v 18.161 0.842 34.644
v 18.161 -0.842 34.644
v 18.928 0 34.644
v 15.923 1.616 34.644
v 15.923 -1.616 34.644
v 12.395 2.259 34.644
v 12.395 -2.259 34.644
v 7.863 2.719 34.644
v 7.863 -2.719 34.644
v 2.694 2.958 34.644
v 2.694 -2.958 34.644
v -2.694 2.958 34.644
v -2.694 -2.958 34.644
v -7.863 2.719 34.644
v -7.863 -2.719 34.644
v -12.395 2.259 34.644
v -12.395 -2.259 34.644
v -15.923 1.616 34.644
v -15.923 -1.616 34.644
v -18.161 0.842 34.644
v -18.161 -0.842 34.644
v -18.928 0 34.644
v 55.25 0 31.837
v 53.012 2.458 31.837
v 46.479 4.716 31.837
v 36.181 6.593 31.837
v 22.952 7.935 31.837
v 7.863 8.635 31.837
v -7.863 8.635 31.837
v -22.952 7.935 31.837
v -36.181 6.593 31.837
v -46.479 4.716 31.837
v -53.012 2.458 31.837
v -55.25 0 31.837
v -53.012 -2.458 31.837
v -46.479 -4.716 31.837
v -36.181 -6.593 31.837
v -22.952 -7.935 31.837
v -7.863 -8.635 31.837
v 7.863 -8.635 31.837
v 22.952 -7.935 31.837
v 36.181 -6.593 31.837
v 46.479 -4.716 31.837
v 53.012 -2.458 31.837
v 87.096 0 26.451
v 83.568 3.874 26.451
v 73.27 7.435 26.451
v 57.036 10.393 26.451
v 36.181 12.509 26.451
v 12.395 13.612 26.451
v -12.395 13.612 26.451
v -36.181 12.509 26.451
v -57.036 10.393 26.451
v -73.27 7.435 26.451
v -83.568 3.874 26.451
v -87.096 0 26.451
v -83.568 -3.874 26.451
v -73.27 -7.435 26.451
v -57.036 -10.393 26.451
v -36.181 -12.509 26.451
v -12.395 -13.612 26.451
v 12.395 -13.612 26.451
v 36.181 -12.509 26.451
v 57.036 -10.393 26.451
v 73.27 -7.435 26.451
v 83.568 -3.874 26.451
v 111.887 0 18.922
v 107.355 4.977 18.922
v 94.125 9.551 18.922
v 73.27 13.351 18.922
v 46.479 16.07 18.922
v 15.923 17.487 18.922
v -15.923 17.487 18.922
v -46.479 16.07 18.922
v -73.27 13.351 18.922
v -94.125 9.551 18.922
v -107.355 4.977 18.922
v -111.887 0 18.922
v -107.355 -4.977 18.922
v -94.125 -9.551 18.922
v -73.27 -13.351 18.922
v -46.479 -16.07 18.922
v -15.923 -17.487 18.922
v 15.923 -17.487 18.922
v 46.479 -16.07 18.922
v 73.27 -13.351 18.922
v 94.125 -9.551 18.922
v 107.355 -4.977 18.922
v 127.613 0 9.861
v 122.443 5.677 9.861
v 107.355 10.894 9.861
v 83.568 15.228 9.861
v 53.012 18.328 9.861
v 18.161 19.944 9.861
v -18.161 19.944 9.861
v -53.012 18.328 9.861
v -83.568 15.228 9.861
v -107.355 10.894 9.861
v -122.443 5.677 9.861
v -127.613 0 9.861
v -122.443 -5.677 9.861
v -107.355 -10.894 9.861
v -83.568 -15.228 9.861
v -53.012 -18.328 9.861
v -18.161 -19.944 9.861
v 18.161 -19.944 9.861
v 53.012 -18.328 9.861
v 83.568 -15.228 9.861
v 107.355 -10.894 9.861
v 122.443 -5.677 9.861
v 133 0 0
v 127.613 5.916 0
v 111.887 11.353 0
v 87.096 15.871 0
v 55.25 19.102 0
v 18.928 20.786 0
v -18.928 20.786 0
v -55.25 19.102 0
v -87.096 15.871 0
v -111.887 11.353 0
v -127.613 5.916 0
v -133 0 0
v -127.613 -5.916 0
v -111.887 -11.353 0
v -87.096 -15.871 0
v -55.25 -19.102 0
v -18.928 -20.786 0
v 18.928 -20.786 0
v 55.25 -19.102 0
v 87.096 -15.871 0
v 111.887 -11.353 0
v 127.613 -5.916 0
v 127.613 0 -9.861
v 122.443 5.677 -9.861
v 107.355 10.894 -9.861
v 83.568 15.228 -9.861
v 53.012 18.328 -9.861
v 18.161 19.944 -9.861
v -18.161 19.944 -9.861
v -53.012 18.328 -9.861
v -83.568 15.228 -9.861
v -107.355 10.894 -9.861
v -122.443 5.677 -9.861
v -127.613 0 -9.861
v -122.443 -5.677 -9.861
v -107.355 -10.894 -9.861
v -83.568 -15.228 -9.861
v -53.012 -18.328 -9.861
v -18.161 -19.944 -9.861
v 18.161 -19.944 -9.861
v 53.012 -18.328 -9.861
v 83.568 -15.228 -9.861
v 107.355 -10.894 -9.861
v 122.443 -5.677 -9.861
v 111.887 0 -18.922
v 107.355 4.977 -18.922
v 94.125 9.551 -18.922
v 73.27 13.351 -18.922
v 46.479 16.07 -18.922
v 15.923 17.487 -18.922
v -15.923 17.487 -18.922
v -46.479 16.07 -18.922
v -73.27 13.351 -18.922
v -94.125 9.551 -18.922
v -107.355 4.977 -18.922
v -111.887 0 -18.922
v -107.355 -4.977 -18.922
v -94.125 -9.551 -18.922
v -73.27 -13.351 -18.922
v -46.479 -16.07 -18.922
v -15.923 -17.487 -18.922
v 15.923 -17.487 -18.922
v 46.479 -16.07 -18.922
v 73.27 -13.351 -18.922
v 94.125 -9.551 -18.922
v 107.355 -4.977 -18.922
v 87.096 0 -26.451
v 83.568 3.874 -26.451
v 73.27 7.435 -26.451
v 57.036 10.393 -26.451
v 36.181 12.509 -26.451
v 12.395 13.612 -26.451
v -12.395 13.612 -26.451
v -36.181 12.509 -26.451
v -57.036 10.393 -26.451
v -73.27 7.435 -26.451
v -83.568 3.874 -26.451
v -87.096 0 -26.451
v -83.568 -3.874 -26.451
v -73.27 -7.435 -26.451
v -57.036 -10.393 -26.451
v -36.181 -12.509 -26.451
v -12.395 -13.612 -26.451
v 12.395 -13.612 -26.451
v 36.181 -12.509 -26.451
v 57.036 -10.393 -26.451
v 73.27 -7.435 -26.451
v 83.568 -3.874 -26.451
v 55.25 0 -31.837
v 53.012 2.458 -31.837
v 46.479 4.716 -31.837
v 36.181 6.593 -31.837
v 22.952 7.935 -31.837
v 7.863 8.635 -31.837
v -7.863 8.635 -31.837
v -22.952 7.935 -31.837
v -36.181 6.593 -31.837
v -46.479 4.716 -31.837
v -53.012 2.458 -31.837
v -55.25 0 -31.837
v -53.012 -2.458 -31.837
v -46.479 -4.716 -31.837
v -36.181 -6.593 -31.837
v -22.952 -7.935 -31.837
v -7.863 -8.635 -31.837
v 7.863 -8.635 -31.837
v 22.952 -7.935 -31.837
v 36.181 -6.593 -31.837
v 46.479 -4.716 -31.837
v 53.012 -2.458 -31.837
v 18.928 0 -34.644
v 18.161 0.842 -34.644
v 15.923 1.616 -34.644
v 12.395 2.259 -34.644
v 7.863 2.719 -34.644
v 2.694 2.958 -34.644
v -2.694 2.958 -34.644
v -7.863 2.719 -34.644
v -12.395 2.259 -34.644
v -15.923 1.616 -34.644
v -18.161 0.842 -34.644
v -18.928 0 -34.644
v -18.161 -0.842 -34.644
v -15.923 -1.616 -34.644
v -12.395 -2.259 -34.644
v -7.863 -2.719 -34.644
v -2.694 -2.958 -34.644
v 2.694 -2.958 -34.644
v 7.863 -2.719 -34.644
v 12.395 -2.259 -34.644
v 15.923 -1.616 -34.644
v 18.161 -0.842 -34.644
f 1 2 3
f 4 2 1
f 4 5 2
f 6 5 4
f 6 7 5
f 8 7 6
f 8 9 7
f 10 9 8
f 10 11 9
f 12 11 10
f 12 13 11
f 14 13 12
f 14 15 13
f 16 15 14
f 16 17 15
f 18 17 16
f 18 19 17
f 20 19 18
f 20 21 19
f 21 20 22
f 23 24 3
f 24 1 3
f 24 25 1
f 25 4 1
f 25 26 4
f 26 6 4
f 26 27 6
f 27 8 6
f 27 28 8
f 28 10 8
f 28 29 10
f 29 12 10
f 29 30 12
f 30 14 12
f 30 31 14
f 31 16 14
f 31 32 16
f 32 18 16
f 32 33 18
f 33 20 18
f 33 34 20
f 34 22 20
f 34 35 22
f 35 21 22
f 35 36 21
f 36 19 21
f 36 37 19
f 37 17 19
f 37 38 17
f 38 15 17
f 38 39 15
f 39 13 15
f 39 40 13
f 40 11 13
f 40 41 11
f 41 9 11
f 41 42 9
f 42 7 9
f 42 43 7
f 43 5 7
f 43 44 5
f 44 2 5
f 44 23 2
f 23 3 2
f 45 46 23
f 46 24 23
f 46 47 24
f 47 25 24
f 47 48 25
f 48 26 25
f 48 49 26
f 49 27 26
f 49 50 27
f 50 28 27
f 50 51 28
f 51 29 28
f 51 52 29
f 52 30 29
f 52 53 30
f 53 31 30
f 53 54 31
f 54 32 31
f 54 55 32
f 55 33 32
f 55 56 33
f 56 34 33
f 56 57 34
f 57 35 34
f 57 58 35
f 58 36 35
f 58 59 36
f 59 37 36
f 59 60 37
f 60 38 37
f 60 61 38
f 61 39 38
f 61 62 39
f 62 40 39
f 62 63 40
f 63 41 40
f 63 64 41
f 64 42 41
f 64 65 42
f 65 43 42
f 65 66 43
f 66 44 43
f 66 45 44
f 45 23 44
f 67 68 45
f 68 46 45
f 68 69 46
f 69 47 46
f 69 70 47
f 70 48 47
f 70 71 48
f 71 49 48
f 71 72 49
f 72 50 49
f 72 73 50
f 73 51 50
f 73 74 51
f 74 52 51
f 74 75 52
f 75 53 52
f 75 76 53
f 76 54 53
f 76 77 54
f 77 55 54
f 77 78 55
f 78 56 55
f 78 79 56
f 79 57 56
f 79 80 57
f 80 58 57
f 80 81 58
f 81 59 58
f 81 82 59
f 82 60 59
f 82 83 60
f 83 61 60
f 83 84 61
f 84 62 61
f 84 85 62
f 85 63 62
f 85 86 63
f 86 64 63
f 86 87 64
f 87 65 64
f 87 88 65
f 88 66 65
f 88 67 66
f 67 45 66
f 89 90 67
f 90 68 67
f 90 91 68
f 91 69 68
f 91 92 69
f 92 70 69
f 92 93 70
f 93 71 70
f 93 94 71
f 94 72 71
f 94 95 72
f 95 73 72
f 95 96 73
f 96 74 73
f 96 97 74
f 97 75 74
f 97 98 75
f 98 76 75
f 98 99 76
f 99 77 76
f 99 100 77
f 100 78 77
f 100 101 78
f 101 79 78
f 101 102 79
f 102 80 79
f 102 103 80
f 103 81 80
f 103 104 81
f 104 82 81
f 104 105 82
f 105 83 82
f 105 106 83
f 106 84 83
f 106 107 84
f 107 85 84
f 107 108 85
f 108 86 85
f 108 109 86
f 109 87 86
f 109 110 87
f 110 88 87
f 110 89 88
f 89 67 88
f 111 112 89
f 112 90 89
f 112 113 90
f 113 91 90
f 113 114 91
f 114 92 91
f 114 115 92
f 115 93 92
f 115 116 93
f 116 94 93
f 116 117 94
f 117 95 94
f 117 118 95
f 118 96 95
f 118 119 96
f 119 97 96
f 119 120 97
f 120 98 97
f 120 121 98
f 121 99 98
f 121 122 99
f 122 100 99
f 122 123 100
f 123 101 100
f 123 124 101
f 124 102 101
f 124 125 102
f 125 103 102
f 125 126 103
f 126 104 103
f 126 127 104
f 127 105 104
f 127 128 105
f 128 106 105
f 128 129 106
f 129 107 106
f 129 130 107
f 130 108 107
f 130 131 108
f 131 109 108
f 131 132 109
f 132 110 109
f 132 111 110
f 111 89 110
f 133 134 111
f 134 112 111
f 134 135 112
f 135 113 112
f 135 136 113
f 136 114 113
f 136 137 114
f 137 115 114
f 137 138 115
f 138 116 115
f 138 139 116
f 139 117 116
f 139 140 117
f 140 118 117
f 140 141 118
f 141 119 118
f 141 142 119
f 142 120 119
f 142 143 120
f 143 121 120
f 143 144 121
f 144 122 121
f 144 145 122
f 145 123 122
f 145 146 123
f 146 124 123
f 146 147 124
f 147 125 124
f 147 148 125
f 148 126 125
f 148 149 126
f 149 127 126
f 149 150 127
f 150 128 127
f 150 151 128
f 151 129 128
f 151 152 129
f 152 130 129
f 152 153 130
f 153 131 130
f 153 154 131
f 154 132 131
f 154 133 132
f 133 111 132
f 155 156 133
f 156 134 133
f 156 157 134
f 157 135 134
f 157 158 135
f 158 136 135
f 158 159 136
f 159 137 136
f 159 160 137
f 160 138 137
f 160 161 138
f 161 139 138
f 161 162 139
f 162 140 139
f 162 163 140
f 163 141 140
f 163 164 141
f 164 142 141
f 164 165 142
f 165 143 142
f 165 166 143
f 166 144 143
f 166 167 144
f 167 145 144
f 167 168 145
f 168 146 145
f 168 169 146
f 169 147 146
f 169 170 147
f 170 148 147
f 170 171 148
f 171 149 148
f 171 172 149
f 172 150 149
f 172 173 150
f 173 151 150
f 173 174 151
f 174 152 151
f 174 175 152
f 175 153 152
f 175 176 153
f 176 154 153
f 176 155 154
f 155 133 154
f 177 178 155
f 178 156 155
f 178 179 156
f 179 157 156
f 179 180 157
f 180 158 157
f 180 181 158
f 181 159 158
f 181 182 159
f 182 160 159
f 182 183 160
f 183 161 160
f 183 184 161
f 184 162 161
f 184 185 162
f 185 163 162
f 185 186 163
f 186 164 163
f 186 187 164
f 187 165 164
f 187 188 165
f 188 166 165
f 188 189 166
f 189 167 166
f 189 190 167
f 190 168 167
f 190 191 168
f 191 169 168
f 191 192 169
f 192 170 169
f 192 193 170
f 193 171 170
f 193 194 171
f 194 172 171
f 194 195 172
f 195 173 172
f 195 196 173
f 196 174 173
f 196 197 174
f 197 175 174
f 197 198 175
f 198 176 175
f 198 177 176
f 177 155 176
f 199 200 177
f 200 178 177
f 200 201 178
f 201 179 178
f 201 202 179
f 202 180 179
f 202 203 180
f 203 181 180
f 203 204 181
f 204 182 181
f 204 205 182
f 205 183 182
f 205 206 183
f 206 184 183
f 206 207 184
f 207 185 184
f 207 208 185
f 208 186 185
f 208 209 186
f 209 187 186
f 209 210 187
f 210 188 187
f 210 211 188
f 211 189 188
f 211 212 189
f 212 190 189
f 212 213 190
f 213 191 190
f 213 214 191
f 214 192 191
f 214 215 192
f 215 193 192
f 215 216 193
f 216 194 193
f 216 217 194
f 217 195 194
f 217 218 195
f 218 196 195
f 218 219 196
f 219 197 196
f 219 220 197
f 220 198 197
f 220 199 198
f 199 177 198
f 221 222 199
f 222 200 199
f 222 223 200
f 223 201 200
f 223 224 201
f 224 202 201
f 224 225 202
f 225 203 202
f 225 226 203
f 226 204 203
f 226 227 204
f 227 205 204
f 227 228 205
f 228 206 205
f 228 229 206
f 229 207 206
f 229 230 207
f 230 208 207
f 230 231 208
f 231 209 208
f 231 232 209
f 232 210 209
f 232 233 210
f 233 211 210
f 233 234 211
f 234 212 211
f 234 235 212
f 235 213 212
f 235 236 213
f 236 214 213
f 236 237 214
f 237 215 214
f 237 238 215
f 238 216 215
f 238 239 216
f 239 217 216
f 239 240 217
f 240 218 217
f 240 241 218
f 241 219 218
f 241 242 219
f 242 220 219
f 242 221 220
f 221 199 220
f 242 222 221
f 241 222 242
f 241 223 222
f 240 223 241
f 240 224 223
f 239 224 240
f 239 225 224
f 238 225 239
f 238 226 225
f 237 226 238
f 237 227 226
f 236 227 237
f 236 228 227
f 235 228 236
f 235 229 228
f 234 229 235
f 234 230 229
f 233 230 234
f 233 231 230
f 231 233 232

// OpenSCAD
// Generated by SolidPython 1.0.1 on 2020-07-29 00:46:53


scale(v = [19, 3, 5]) {
	sphere(r = 7);
}
/***********************************************
*********      SolidPython code:      **********
************************************************
 
# import packages: SolidPython
from solid import *
from solid.utils import *
from itertools import chain, combinations, permutations


class Resize:

    def __init__(self, scad_file):
        self.scad_file = scad_file
        #self.scad_file = import_scad(scad_file)
        # cone/cylinder param:
        self.r1 = 0
        self.r2 = 0
        self.h = 0
        # rectangular prism param:
        self.w = 0
        self.l = 0
        # ellipse param:
        self.r = 0

    # import OpenScad code (file name corresponds to shape)


    # classify shape + parameters
    def assign(self, param1, param2, param3):
        if self.scad_file == 'cone.scad':
            self.r1 = param1
            self.r2 = param2
            self.h = param3
        elif self.scad_file == 'cylinder.scad':
            self.r1 = param1
            self.r2 = param2
            self.h = param3
        elif self.scad_file == 'rectangularPrism.scad':
            self.h = param1
            self.l = param2
            self.w = param3
        else:
            self.r = param1
            self.h = param2

    # resize parameters
    def iterate(self):
        x = range(3, 20, 2)
        i = 1
        if self.scad_file == 'cone.scad':
            tempList = list(permutations(x, 2))
            for temp in tempList:
                param1 = temp[0]
                param2 = temp[1]
                filepath = 'produced_scad_files/' + 'cone' + str(param1) + '_' + str(param2) + '_' + '.scad'
                scad_render_to_file(cylinder(h=param1, r1=param2, r2=0), filepath)

        elif self.scad_file == 'cylinder.scad':
            tempList = list(permutations(x, 3))
            for temp in tempList:
                param1 = temp[0]
                param2 = temp[1]
                filepath = 'produced_scad_files/' + 'cylinder' + str(param1) + '_' + str(param2) + '_' + '.scad'
                scad_render_to_file(cylinder(h=param1, r1=param2, r2=param2), filepath)

        elif self.scad_file == 'rectangularPrism.scad':
            tempList = list(permutations(x, 3))
            for temp in tempList:
                param1 = temp[0]
                param2 = temp[1]
                param3 = temp[2]
                filepath = 'produced_scad_files/' + 'rectangularPrism' + str(param1) + '_' + str(param2) + '_' + str(
                    param3) + '.scad'
                scad_render_to_file(cube(size=(param1, param2, param3)), filepath)

        elif self.scad_file == 'ellipse.scad':
            tempList = list(permutations(x, 4))
            for temp in tempList:
                param1 = temp[0]
                param2 = temp[1]
                param3 = temp[2]
                param4 = temp[3]
                filepath = 'produced_scad_files/' + 'ellipse' + str(param1) + '_' + str(param2) + '_' + str(param3) + '_' + str(param4) + '.scad'
                scad_render_to_file(scale([param1, param2, param3])(sphere(r=param4)), filepath)

    def render_to_scadfile(self):
        scad_render_to_file(scad, 'example.scad') 
 
************************************************/
